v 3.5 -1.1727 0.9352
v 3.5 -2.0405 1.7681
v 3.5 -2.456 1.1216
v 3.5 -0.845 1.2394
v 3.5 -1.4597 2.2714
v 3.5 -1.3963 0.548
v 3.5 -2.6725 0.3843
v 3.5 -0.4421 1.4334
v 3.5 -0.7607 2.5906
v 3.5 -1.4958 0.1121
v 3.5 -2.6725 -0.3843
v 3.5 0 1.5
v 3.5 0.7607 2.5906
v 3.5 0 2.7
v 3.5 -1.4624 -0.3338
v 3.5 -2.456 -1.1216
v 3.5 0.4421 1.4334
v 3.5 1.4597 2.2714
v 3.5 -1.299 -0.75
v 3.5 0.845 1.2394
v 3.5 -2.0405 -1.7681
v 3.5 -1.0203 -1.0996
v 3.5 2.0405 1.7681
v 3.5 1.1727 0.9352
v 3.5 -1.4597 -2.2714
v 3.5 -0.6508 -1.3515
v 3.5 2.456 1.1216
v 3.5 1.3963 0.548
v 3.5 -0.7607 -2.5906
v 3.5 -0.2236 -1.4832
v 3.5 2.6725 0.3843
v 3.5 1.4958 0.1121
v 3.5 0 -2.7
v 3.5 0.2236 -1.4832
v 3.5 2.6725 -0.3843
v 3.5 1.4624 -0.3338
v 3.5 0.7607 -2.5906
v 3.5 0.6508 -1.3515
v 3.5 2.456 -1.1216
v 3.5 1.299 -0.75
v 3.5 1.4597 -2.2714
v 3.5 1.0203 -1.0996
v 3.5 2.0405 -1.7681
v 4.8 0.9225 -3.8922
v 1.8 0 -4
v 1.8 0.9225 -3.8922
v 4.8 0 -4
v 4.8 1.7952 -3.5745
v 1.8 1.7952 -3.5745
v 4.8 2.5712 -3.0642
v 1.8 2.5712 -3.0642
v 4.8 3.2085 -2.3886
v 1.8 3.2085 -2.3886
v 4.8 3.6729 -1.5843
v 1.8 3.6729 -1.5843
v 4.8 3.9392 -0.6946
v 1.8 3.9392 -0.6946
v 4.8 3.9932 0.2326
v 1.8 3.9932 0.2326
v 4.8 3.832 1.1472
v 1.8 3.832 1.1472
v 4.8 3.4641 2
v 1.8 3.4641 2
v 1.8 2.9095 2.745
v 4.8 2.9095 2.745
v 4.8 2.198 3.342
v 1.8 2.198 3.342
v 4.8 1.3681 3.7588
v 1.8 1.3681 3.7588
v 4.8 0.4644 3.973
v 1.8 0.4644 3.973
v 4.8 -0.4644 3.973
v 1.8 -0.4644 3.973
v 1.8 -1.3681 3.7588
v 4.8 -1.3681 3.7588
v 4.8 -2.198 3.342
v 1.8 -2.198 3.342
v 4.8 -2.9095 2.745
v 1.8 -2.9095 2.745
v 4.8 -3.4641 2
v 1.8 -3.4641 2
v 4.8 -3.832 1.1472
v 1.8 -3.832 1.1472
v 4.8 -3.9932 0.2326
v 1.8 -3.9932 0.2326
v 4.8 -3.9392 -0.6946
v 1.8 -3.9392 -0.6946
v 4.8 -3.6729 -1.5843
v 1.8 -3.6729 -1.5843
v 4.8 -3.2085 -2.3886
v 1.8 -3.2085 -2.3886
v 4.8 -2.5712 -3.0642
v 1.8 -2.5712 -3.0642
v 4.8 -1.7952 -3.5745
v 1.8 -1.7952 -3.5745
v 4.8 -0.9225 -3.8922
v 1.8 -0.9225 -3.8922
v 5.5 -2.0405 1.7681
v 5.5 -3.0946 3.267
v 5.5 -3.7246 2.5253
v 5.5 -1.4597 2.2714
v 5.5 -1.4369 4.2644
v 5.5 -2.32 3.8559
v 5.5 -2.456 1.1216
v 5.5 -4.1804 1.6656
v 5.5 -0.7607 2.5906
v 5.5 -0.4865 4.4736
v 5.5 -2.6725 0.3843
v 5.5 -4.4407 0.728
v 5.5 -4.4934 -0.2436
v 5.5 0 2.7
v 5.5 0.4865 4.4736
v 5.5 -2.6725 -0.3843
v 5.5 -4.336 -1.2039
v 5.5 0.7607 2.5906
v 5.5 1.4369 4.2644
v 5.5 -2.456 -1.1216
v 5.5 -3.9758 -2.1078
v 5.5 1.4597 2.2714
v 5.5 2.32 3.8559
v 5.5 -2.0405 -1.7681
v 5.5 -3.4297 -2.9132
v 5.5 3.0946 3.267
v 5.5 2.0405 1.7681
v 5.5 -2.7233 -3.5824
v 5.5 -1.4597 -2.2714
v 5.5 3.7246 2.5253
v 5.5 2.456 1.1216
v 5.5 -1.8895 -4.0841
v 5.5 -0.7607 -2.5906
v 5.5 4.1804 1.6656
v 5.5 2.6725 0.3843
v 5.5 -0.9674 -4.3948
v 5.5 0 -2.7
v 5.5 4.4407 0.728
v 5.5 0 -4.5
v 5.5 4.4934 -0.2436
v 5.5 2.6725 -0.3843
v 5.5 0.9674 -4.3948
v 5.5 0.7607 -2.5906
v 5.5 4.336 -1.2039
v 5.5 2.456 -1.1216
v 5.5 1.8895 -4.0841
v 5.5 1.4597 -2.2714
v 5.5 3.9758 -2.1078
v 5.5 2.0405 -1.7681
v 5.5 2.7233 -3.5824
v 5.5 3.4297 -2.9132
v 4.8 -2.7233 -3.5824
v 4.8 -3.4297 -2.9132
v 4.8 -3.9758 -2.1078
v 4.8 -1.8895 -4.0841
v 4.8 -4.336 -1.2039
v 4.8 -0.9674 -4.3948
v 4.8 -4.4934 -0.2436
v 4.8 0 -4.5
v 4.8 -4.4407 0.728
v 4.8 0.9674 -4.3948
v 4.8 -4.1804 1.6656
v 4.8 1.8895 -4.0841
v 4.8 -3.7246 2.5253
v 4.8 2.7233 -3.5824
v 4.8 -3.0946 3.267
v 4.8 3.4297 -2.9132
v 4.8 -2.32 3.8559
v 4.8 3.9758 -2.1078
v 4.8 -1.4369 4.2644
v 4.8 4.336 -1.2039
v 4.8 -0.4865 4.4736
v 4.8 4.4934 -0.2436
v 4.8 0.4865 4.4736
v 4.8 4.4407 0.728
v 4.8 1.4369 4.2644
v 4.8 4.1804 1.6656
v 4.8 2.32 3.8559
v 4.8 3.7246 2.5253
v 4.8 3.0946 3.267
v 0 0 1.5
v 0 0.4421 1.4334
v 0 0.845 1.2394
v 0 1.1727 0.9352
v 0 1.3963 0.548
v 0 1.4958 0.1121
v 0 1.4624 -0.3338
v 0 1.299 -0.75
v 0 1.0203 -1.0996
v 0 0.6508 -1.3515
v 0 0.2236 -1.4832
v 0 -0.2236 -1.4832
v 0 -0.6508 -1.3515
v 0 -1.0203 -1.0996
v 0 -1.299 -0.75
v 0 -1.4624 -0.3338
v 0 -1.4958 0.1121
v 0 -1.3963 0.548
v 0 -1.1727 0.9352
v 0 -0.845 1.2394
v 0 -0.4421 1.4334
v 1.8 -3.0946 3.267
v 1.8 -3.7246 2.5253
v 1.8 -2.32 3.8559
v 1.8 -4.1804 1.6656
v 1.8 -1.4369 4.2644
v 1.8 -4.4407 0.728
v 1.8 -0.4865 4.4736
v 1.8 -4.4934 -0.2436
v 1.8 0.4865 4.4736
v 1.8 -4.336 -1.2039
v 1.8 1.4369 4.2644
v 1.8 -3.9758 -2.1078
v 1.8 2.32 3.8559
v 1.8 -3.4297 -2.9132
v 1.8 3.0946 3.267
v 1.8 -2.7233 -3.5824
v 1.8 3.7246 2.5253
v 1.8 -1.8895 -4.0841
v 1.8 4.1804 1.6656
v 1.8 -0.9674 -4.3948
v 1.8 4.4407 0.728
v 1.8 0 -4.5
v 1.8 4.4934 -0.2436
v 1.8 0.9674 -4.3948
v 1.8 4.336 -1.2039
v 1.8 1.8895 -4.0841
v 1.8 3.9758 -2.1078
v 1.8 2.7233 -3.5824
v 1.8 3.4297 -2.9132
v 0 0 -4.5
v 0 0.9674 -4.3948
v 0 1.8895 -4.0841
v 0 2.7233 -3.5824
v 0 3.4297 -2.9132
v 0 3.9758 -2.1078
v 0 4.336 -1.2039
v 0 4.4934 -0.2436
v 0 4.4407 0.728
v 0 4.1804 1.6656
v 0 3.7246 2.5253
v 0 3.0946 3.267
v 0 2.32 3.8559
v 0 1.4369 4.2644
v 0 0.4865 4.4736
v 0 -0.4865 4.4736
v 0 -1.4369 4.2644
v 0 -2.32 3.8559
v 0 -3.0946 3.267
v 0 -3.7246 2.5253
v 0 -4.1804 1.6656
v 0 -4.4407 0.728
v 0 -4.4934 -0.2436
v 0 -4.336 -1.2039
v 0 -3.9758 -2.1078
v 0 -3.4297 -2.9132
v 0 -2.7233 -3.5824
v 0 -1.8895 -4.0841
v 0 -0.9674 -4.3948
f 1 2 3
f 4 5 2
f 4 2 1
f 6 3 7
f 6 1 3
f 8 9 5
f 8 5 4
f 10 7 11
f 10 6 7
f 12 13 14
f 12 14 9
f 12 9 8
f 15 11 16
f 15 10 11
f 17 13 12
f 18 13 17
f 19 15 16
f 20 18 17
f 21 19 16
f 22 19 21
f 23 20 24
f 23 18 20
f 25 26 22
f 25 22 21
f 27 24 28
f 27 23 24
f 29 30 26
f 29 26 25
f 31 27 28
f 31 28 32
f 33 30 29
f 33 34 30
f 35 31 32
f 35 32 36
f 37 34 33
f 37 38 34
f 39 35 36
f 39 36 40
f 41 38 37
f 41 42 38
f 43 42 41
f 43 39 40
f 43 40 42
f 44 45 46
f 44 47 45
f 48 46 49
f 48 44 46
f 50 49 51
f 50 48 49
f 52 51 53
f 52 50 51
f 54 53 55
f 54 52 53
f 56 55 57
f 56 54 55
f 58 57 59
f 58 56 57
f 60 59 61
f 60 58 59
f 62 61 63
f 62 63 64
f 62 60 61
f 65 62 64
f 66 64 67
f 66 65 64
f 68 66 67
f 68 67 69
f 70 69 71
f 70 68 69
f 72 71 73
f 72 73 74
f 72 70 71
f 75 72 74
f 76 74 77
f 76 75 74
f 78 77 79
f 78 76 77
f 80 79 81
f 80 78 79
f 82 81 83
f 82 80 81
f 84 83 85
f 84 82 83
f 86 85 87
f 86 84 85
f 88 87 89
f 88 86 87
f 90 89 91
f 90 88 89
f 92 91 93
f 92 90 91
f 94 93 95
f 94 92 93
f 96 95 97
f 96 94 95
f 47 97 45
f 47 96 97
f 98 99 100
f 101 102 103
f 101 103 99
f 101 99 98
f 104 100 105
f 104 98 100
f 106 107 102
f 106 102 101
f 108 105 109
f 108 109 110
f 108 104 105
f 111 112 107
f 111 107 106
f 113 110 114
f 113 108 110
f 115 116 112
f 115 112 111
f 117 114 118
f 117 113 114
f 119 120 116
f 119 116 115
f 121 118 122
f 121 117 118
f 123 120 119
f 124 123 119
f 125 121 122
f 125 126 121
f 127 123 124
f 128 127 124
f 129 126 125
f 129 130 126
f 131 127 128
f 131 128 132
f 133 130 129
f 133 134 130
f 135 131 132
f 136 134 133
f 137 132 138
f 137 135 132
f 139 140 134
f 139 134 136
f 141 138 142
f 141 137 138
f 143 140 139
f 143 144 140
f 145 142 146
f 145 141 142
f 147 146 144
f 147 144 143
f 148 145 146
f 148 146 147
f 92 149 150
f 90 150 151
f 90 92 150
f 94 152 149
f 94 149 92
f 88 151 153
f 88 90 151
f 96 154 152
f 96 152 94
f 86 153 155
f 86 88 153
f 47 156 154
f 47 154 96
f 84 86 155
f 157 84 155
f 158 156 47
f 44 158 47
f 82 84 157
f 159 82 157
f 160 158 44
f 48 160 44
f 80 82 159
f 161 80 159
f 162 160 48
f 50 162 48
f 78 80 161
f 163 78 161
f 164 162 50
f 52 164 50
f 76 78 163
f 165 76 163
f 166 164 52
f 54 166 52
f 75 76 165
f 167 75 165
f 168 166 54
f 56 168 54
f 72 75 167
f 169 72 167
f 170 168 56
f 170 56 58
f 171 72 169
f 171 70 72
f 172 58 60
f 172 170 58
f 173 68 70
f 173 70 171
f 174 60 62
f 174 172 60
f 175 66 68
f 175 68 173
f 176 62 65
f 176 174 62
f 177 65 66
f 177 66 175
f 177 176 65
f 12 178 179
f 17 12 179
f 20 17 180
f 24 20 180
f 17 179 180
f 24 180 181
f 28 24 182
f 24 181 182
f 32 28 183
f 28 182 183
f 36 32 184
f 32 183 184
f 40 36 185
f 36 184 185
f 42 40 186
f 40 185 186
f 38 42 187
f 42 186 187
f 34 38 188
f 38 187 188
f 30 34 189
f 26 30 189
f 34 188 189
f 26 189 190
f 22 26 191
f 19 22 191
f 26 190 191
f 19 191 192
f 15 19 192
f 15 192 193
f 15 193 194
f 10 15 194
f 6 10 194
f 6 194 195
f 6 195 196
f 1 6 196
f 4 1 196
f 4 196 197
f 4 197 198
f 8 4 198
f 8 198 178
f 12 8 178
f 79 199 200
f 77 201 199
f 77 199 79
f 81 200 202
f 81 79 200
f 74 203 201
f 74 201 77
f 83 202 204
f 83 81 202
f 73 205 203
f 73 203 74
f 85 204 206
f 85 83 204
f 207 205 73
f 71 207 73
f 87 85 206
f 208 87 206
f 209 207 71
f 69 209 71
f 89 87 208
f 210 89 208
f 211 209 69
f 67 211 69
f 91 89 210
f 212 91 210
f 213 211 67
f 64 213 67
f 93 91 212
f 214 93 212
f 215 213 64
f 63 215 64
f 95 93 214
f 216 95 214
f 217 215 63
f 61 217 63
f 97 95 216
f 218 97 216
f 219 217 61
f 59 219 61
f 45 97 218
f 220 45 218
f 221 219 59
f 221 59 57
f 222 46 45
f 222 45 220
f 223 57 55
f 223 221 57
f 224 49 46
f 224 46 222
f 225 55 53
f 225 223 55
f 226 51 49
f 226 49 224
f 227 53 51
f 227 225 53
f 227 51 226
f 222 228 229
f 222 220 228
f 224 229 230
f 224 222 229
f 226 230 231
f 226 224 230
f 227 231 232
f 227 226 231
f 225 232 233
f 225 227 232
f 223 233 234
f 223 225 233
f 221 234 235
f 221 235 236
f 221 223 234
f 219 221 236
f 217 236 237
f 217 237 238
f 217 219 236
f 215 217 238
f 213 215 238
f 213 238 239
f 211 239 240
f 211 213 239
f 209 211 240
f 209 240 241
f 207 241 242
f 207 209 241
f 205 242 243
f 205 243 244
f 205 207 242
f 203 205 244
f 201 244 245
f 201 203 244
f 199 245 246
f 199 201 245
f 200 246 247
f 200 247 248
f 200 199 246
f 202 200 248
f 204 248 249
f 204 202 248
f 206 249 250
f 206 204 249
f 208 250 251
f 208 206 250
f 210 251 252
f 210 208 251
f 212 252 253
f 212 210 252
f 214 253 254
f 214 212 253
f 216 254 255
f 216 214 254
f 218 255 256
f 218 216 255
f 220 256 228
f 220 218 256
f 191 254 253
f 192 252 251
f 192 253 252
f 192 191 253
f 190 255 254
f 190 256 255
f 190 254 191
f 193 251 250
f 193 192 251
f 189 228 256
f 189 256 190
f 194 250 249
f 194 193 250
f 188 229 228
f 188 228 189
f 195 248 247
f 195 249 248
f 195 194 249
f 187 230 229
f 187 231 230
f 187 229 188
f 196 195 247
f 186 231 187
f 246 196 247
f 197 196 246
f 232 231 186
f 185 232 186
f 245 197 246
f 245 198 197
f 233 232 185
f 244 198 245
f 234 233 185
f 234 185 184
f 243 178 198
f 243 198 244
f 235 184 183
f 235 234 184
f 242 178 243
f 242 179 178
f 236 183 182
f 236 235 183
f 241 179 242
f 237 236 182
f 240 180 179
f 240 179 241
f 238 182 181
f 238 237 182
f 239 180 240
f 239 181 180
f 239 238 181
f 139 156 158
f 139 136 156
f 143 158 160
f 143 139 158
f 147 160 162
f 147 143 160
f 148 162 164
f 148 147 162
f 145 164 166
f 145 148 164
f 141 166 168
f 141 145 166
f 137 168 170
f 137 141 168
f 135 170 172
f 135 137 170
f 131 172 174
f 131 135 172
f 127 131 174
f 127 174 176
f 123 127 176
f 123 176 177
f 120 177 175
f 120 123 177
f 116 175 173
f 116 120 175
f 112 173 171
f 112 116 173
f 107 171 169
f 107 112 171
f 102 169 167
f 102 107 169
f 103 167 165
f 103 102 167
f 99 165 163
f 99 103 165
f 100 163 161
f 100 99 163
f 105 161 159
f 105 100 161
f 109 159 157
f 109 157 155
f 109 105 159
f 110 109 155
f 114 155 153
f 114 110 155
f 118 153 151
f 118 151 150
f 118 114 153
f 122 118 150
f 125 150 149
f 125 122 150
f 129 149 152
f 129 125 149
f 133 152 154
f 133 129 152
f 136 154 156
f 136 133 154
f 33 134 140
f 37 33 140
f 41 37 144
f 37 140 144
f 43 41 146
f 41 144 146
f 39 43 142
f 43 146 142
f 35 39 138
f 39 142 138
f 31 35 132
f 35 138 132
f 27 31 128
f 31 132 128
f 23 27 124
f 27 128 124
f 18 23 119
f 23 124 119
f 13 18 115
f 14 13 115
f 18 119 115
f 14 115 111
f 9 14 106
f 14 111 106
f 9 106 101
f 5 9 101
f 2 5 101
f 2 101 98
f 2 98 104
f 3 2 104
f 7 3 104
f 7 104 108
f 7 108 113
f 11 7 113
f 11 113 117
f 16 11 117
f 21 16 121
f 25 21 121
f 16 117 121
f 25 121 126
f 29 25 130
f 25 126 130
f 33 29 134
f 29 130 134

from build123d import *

# Parameters (mm, degrees)
SKETCH2_R          = 1.5
CUT_EXTRUDE1_DEPTH = 10
SKETCH3_R          = 2.7
CUT_EXTRUDE2_DEPTH = 2


with BuildPart() as part:
    # Sketch1 → Revolve1 (revolve)
    with BuildSketch(Plane(origin=(0, 0, 0), x_dir=(1, 0, 0), z_dir=(0, 1, 0))):
        Polygon((0, 0), (0, 4.5), (1.8, 4.5), (1.8, 4), (4.8, 4), (4.8, 4.5), (5.5, 4.5), (5.5, 0), align=None)
    revolve(axis=Axis((-92.33576491, 0, 0), (1, 0, 0)))

    # Sketch2 → Cut-Extrude1 (cut)
    with BuildSketch(Plane.ZY):
        Circle(SKETCH2_R)
    extrude(amount=-CUT_EXTRUDE1_DEPTH, mode=Mode.SUBTRACT)

    # Sketch3 → Cut-Extrude2 (cut)
    with BuildSketch(Plane(origin=(5.5, 0, 0), x_dir=(0, 0, -1), z_dir=(1, 0, 0))):
        Circle(SKETCH3_R)
    extrude(amount=-CUT_EXTRUDE2_DEPTH, mode=Mode.SUBTRACT)


solid = part.part
